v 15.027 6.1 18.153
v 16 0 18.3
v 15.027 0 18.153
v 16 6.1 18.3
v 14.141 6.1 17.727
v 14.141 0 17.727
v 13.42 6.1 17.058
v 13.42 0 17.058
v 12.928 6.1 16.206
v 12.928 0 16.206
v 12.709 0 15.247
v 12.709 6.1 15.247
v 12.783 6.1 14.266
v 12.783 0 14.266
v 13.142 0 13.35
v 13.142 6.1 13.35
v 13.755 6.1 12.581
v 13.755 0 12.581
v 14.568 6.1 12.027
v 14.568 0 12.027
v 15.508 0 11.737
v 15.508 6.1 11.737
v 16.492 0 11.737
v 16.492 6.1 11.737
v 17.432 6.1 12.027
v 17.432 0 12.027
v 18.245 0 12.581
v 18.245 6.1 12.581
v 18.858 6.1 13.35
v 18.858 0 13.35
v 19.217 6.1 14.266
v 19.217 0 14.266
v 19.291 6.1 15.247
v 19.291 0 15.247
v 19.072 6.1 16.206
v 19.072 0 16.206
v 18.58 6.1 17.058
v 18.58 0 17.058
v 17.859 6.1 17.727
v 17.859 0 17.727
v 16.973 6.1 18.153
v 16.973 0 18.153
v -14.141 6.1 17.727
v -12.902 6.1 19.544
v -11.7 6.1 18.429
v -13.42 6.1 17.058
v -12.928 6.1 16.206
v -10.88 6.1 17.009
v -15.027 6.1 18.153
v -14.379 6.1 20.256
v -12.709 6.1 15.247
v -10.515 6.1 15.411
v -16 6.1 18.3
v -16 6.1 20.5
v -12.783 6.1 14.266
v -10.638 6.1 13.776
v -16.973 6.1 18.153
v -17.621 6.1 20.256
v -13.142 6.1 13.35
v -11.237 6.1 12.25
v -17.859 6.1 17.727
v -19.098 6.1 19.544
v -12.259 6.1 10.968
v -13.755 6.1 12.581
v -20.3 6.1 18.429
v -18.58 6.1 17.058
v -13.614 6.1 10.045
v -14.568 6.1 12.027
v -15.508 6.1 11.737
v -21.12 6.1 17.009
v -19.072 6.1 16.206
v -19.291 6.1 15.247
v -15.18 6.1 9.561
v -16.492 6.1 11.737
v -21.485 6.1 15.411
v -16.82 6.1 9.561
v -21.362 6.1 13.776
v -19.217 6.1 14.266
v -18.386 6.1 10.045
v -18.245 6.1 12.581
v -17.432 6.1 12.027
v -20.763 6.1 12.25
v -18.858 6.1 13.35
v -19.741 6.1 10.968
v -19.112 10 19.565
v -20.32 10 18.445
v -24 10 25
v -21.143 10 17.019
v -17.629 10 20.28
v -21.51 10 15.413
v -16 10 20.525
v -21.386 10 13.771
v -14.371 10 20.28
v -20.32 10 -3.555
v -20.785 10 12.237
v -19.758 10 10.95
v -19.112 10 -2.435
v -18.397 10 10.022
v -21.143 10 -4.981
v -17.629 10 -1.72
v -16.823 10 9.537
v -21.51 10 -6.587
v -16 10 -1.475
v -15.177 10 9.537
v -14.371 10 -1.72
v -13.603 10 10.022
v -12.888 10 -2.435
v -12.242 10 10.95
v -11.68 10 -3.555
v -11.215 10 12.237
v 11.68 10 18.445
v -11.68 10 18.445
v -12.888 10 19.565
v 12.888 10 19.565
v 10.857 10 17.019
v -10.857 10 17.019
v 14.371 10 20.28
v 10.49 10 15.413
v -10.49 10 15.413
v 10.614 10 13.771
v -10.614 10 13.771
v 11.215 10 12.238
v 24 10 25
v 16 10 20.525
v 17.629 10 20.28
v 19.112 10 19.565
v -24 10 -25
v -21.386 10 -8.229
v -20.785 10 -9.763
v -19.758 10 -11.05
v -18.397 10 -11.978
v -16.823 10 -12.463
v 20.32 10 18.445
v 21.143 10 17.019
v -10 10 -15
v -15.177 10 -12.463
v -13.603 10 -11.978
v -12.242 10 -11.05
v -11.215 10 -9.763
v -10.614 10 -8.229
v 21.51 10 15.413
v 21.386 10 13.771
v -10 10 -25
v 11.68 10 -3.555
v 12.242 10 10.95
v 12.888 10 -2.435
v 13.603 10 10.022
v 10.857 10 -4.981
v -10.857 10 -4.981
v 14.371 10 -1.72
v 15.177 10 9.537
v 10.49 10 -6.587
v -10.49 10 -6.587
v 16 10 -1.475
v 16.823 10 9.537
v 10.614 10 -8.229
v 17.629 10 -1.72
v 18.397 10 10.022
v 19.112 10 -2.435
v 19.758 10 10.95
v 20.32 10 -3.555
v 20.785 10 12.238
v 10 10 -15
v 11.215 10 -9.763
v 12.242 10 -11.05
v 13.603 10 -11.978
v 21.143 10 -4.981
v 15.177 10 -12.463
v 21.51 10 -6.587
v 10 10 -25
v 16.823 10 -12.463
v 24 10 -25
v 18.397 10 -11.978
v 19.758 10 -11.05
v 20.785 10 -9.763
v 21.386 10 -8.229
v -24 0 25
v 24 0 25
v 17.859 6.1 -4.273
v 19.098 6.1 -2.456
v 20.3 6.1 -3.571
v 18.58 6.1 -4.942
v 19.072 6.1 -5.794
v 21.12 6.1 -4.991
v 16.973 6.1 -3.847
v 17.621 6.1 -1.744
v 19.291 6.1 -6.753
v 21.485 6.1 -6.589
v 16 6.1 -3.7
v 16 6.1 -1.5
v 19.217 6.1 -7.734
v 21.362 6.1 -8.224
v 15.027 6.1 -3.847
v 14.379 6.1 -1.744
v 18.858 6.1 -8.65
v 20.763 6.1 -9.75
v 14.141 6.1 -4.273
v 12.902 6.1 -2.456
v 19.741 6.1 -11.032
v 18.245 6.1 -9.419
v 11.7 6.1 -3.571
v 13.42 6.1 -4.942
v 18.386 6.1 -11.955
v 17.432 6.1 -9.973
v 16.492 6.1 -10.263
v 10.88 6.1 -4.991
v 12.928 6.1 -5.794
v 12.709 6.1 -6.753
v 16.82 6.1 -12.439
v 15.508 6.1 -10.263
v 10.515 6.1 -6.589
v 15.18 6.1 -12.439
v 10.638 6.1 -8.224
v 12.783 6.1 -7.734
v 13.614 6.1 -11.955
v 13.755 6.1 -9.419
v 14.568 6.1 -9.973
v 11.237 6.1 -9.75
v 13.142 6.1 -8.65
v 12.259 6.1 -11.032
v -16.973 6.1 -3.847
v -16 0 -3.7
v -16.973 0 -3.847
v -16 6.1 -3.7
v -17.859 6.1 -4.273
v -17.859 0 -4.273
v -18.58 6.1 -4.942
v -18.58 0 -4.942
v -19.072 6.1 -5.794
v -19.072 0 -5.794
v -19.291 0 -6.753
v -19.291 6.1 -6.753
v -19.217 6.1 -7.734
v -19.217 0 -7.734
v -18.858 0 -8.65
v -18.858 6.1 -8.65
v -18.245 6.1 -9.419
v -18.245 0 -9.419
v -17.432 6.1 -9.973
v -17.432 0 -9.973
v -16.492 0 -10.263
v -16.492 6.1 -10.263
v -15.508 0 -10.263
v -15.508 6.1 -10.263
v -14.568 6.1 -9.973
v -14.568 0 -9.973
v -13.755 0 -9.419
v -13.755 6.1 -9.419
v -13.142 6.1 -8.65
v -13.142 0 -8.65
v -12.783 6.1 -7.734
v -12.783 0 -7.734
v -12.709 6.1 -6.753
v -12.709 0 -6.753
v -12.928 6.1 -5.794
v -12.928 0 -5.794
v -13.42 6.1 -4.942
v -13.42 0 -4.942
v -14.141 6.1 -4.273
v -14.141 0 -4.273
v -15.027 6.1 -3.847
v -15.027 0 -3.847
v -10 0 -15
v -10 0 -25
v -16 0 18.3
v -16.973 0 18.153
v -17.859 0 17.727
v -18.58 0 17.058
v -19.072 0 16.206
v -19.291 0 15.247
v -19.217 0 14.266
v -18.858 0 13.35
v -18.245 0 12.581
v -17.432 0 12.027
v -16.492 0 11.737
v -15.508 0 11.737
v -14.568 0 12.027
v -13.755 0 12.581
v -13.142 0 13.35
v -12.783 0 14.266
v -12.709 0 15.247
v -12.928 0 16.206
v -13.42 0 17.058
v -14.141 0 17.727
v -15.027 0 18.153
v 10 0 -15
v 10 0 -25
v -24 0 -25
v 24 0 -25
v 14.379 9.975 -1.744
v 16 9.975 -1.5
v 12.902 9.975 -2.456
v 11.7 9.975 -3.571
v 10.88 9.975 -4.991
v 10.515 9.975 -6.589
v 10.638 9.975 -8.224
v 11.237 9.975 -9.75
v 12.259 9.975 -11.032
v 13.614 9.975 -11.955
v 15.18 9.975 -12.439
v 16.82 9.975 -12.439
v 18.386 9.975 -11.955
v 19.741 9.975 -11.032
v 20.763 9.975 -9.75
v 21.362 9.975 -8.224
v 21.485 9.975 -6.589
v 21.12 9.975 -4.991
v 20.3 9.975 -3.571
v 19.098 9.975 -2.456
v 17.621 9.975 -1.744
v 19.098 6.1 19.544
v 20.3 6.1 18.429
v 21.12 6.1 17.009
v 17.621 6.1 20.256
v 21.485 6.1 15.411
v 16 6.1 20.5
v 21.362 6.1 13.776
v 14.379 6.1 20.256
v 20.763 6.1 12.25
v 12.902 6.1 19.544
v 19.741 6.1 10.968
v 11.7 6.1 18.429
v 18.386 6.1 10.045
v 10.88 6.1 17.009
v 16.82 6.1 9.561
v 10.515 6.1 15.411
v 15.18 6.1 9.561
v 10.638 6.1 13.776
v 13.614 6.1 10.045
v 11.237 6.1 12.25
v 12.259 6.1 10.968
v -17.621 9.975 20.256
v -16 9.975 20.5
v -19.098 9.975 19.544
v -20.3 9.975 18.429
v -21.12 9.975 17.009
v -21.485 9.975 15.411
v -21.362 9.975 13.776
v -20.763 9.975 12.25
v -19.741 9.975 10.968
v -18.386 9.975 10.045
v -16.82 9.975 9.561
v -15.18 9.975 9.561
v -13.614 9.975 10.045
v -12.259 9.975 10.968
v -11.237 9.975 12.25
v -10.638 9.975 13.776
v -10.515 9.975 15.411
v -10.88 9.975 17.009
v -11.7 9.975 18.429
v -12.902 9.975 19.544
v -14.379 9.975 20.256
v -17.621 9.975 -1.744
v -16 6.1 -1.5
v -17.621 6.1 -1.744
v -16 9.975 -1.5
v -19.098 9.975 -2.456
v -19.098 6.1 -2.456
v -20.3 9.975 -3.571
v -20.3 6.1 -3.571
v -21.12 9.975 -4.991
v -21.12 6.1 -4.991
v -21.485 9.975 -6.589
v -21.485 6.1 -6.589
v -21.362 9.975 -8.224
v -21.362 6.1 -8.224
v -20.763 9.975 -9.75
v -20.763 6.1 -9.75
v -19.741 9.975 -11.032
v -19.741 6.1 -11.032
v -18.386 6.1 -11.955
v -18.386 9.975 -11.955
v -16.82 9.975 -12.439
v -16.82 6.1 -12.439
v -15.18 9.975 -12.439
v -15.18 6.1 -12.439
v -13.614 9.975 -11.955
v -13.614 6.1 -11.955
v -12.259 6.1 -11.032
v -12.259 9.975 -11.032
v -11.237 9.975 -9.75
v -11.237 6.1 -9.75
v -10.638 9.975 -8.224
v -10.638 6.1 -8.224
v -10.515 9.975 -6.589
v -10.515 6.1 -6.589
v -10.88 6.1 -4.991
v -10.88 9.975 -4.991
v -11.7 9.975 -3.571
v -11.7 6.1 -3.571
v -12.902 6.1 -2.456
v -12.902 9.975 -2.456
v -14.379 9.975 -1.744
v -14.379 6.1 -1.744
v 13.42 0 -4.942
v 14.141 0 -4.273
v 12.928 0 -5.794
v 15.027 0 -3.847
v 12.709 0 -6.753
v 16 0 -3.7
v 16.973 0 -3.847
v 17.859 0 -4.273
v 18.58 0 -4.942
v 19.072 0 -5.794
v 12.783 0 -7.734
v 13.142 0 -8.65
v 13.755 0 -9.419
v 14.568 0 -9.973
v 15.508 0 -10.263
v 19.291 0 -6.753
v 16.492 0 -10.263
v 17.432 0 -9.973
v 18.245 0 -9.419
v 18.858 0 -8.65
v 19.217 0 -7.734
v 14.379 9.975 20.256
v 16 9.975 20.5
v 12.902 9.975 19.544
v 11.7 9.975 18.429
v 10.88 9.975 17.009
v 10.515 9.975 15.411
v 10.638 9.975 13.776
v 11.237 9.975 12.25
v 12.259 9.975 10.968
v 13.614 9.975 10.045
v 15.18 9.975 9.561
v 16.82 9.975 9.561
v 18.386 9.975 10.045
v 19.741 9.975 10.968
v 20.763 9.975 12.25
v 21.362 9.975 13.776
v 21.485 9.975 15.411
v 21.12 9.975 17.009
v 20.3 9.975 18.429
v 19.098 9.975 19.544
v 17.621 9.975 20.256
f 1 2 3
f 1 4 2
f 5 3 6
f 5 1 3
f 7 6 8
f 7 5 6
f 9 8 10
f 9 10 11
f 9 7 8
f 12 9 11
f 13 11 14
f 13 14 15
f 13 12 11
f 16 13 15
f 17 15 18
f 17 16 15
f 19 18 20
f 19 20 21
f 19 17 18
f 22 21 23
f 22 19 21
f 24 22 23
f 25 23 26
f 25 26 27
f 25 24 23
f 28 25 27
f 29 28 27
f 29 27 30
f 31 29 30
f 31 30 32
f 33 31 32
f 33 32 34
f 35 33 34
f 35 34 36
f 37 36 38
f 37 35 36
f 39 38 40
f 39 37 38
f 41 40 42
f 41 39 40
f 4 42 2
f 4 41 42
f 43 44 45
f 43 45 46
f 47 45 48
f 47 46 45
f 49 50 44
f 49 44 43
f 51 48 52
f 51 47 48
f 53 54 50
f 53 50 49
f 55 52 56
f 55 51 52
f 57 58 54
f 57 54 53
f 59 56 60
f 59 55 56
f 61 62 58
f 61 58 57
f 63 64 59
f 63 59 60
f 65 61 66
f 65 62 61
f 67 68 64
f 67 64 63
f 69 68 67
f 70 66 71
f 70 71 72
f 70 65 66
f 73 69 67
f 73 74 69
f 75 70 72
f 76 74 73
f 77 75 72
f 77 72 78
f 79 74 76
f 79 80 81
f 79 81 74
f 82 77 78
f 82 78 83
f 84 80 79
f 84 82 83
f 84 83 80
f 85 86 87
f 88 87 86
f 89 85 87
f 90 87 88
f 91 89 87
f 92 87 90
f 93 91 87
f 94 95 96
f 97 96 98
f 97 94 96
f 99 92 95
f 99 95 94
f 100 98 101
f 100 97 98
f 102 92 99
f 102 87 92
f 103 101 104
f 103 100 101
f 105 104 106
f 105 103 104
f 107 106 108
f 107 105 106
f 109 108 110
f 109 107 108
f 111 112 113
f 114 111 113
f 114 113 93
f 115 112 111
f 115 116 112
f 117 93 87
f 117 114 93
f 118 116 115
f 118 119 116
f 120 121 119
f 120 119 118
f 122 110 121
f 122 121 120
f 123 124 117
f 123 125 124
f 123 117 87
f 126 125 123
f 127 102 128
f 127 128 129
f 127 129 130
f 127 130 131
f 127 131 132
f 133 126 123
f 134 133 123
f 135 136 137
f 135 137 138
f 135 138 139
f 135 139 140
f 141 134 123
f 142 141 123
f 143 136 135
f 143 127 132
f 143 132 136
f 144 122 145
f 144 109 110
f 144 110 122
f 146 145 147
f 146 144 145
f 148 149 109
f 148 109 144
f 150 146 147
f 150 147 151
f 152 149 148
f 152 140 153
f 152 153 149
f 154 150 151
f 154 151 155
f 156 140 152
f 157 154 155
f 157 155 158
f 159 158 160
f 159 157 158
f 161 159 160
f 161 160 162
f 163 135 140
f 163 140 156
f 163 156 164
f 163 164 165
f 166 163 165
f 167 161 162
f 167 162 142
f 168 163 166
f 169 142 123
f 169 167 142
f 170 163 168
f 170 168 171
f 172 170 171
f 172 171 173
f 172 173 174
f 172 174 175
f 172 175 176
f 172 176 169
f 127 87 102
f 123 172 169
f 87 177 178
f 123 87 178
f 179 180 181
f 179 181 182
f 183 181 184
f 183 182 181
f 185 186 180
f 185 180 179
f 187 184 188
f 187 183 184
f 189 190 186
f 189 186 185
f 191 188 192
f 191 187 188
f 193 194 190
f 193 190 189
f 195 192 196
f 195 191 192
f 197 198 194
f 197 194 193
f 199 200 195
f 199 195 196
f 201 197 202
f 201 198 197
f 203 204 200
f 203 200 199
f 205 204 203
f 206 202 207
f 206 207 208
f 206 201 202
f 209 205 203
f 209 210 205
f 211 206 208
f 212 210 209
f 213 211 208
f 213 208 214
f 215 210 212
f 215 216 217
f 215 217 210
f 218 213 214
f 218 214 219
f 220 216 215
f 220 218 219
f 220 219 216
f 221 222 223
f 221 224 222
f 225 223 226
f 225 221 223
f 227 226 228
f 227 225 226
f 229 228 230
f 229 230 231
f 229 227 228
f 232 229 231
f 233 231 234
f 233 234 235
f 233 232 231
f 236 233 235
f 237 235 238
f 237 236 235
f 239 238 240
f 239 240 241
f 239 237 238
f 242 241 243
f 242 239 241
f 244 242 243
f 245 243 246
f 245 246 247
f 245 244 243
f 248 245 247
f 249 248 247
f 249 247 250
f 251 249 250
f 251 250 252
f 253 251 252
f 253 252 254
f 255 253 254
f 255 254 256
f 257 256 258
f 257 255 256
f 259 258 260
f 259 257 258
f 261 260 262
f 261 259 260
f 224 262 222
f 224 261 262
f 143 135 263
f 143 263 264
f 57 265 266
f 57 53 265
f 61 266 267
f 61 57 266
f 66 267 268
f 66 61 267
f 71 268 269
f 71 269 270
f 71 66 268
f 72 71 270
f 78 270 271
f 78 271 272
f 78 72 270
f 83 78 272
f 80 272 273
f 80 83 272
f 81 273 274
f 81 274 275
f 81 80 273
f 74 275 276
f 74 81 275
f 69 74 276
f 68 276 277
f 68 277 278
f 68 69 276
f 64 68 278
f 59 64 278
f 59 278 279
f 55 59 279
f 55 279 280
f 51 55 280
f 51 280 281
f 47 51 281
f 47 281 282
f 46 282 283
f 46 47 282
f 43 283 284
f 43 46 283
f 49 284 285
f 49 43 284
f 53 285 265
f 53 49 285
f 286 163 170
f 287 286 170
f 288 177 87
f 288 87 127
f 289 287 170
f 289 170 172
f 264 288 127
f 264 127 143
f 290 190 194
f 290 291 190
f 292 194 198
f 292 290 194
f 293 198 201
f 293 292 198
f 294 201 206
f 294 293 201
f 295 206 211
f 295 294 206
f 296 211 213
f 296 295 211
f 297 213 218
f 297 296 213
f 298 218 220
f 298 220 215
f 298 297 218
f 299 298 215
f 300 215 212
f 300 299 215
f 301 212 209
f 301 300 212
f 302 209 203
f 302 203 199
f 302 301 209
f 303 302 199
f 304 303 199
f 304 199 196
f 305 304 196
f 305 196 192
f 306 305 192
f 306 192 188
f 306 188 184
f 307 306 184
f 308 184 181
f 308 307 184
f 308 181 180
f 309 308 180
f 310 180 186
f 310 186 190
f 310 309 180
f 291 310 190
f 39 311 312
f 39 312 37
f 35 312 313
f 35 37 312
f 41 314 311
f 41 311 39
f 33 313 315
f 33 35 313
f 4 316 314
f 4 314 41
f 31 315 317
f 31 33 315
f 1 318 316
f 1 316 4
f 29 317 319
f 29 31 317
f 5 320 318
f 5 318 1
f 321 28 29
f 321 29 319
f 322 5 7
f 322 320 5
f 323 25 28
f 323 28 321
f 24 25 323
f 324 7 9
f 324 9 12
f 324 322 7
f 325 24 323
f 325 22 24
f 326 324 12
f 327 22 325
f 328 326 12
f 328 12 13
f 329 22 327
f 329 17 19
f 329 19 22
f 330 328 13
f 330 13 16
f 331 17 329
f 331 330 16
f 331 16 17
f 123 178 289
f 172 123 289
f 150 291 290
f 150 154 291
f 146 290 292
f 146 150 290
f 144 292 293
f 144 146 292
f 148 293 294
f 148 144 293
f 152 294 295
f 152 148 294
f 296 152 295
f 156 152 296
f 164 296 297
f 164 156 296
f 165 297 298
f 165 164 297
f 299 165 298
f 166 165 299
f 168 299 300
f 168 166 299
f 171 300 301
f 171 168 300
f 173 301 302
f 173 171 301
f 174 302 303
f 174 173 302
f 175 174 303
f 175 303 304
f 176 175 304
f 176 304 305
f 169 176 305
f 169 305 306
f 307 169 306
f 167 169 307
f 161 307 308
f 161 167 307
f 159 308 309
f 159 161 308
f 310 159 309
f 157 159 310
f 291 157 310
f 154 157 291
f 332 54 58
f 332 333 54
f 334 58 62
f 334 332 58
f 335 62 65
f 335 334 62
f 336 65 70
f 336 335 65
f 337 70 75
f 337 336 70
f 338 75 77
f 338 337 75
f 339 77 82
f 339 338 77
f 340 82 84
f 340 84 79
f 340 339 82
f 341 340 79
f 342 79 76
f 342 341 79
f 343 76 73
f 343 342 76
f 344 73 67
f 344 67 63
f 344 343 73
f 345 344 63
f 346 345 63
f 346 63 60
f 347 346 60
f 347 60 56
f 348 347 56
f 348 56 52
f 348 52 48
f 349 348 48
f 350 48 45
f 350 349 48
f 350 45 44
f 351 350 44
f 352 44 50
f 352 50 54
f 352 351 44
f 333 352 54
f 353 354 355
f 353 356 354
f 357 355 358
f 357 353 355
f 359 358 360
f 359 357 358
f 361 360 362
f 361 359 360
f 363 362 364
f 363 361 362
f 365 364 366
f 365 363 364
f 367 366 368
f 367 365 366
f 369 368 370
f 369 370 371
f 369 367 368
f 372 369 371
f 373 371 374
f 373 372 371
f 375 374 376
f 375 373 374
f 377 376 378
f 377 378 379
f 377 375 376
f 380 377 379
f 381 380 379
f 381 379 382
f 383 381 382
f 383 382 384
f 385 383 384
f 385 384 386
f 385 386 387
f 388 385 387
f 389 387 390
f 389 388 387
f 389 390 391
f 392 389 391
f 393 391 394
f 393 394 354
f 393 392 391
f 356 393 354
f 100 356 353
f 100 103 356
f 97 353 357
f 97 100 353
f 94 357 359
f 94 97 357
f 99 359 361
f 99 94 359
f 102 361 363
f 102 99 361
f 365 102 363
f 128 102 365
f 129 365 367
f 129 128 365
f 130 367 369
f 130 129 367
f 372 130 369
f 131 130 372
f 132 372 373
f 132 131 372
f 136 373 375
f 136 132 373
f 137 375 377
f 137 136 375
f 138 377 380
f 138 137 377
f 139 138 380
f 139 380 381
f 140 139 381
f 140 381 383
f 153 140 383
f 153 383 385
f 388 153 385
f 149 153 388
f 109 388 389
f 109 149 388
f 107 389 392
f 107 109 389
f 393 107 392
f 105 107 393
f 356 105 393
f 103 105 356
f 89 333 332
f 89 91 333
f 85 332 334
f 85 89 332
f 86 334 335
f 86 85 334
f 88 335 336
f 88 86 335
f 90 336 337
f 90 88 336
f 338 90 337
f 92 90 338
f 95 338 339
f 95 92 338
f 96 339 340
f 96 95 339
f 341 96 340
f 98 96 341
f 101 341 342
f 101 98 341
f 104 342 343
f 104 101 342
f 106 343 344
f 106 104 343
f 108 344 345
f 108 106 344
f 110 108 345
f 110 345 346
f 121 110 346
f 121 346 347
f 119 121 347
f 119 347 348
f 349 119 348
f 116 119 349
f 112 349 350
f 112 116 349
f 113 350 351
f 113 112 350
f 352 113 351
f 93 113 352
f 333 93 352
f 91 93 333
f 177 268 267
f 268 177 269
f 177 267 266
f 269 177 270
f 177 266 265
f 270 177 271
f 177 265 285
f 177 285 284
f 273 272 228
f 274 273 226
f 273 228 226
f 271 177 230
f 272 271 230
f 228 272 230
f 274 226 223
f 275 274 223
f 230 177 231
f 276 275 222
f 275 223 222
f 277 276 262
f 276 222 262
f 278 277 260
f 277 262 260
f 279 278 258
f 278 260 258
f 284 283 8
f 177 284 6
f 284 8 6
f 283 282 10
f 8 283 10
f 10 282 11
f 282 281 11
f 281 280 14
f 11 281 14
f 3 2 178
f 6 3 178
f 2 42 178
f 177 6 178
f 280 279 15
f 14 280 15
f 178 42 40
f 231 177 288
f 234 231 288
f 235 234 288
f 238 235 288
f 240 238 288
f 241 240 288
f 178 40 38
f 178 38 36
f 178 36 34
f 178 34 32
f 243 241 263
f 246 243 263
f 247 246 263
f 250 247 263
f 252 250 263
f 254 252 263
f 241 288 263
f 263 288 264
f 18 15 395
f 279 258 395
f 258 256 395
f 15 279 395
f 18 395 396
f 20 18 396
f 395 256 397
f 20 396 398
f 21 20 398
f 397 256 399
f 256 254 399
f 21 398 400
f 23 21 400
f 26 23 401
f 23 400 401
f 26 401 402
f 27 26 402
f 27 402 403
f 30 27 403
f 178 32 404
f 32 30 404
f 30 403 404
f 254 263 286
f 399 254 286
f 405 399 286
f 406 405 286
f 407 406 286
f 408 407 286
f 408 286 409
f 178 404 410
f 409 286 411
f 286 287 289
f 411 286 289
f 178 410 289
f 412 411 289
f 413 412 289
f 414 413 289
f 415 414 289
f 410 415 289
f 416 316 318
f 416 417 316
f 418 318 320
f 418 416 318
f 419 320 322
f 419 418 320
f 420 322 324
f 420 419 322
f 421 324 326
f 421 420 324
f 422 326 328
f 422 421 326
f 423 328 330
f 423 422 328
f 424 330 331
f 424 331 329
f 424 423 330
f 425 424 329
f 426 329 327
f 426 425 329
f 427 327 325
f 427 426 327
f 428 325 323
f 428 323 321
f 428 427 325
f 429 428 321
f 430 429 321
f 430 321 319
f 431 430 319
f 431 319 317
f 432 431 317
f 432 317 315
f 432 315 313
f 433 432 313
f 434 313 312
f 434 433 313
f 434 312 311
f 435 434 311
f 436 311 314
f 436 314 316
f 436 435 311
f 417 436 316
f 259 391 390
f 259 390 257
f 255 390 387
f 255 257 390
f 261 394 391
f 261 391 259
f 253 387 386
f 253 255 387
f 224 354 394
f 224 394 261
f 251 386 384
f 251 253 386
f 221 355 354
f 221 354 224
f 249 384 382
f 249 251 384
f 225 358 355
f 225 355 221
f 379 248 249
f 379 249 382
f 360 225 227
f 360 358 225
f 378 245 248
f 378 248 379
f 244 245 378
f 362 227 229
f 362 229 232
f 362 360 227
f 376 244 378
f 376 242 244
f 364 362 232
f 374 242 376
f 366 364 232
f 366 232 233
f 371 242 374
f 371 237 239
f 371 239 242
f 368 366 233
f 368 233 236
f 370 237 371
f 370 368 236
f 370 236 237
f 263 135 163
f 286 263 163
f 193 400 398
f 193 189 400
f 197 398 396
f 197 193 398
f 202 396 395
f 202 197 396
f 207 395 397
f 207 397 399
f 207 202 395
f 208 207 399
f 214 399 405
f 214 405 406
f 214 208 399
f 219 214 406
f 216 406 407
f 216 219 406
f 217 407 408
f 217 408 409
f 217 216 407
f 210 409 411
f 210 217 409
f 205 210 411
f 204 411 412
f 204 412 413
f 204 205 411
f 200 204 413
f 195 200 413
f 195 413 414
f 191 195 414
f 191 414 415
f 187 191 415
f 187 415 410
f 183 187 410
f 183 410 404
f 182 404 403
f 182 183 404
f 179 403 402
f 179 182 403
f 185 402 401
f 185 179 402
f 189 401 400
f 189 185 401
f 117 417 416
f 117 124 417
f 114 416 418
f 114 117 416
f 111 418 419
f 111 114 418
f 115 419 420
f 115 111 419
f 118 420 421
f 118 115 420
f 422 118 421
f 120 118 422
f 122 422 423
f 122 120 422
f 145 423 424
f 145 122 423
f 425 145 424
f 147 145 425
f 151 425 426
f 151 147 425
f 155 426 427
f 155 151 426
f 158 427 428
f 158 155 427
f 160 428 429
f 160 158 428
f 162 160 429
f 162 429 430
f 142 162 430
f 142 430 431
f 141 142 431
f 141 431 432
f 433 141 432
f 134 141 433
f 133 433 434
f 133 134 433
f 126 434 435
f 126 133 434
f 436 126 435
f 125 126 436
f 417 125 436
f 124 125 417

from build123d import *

# Parameters (mm, degrees)
SKETCH1_W                                  = 48
SKETCH1_H                                  = 50
BOSS_EXTRUDE1_DEPTH                        = 10
SKETCH2_W                                  = 20
SKETCH2_H                                  = 20
CUT_EXTRUDE1_DEPTH                         = 10
CBORE_FOR_M6_CHEESE_HEAD_SCREW1_AT_2_COUNT = 2
CBORE_FOR_M6_CHEESE_HEAD_SCREW1_AT_2_PITCH = 22
CBORE_FOR_M6_CHEESE_HEAD_SCREW1_AT_3_COUNT = 2
CBORE_FOR_M6_CHEESE_HEAD_SCREW1_AT_3_PITCH = 38.832975678
CBORE_FOR_M6_CHEESE_HEAD_SCREW1_AT_4_COUNT = 2
CBORE_FOR_M6_CHEESE_HEAD_SCREW1_AT_4_PITCH = 32


with BuildPart() as part:
    # Sketch1 → Boss-Extrude1 (new body)
    with BuildSketch(Plane(origin=(0, 0, 0), x_dir=(1, 0, 0), z_dir=(0, 1, 0))):
        Rectangle(SKETCH1_W, SKETCH1_H)
    extrude(amount=BOSS_EXTRUDE1_DEPTH)

    # Sketch2 → Cut-Extrude1 (cut)
    with BuildSketch(Plane(origin=(0, 10, 0), x_dir=(1, 0, 0), z_dir=(0, 1, 0))):
        with Locations((0, 25)):
            Rectangle(SKETCH2_W, SKETCH2_H)
    extrude(amount=-CUT_EXTRUDE1_DEPTH, mode=Mode.SUBTRACT)

    # Sketch4 → CBORE for M6 Cheese Head Screw1 (revolve, cut)
    with BuildSketch(Plane(origin=(-16, 10, -7), x_dir=(0, 0, 1), z_dir=(1, 0, 0))):
        Polygon((0, 0), (0, 11.982840043), (3.3, 10), (3.3, 3.9), (5.5, 3.9), (5.5, 0.025), (5.525, 0), align=None)
    cbore_for_m6_cheese_head_screw1 = revolve(axis=Axis((-16, 16.35, -7), (0, -1, 0)), mode=Mode.SUBTRACT)

    # CBORE for M6 Cheese Head Screw1 at 2: CBORE for M6 Cheese Head Screw1 ×2
    with Locations(*[(0, 0, i * CBORE_FOR_M6_CHEESE_HEAD_SCREW1_AT_2_PITCH) for i in range(1, CBORE_FOR_M6_CHEESE_HEAD_SCREW1_AT_2_COUNT)]):
        add(cbore_for_m6_cheese_head_screw1, mode=Mode.SUBTRACT)

    # CBORE for M6 Cheese Head Screw1 at 3: CBORE for M6 Cheese Head Screw1 ×2
    with Locations(*[Vector(0.8240419241993677, 0, 0.5665288228870652) * (i * CBORE_FOR_M6_CHEESE_HEAD_SCREW1_AT_3_PITCH) for i in range(1, CBORE_FOR_M6_CHEESE_HEAD_SCREW1_AT_3_COUNT)]):
        add(cbore_for_m6_cheese_head_screw1, mode=Mode.SUBTRACT)

    # CBORE for M6 Cheese Head Screw1 at 4: CBORE for M6 Cheese Head Screw1 ×2
    with Locations(*[(i * CBORE_FOR_M6_CHEESE_HEAD_SCREW1_AT_4_PITCH, 0, 0) for i in range(1, CBORE_FOR_M6_CHEESE_HEAD_SCREW1_AT_4_COUNT)]):
        add(cbore_for_m6_cheese_head_screw1, mode=Mode.SUBTRACT)


solid = part.part
